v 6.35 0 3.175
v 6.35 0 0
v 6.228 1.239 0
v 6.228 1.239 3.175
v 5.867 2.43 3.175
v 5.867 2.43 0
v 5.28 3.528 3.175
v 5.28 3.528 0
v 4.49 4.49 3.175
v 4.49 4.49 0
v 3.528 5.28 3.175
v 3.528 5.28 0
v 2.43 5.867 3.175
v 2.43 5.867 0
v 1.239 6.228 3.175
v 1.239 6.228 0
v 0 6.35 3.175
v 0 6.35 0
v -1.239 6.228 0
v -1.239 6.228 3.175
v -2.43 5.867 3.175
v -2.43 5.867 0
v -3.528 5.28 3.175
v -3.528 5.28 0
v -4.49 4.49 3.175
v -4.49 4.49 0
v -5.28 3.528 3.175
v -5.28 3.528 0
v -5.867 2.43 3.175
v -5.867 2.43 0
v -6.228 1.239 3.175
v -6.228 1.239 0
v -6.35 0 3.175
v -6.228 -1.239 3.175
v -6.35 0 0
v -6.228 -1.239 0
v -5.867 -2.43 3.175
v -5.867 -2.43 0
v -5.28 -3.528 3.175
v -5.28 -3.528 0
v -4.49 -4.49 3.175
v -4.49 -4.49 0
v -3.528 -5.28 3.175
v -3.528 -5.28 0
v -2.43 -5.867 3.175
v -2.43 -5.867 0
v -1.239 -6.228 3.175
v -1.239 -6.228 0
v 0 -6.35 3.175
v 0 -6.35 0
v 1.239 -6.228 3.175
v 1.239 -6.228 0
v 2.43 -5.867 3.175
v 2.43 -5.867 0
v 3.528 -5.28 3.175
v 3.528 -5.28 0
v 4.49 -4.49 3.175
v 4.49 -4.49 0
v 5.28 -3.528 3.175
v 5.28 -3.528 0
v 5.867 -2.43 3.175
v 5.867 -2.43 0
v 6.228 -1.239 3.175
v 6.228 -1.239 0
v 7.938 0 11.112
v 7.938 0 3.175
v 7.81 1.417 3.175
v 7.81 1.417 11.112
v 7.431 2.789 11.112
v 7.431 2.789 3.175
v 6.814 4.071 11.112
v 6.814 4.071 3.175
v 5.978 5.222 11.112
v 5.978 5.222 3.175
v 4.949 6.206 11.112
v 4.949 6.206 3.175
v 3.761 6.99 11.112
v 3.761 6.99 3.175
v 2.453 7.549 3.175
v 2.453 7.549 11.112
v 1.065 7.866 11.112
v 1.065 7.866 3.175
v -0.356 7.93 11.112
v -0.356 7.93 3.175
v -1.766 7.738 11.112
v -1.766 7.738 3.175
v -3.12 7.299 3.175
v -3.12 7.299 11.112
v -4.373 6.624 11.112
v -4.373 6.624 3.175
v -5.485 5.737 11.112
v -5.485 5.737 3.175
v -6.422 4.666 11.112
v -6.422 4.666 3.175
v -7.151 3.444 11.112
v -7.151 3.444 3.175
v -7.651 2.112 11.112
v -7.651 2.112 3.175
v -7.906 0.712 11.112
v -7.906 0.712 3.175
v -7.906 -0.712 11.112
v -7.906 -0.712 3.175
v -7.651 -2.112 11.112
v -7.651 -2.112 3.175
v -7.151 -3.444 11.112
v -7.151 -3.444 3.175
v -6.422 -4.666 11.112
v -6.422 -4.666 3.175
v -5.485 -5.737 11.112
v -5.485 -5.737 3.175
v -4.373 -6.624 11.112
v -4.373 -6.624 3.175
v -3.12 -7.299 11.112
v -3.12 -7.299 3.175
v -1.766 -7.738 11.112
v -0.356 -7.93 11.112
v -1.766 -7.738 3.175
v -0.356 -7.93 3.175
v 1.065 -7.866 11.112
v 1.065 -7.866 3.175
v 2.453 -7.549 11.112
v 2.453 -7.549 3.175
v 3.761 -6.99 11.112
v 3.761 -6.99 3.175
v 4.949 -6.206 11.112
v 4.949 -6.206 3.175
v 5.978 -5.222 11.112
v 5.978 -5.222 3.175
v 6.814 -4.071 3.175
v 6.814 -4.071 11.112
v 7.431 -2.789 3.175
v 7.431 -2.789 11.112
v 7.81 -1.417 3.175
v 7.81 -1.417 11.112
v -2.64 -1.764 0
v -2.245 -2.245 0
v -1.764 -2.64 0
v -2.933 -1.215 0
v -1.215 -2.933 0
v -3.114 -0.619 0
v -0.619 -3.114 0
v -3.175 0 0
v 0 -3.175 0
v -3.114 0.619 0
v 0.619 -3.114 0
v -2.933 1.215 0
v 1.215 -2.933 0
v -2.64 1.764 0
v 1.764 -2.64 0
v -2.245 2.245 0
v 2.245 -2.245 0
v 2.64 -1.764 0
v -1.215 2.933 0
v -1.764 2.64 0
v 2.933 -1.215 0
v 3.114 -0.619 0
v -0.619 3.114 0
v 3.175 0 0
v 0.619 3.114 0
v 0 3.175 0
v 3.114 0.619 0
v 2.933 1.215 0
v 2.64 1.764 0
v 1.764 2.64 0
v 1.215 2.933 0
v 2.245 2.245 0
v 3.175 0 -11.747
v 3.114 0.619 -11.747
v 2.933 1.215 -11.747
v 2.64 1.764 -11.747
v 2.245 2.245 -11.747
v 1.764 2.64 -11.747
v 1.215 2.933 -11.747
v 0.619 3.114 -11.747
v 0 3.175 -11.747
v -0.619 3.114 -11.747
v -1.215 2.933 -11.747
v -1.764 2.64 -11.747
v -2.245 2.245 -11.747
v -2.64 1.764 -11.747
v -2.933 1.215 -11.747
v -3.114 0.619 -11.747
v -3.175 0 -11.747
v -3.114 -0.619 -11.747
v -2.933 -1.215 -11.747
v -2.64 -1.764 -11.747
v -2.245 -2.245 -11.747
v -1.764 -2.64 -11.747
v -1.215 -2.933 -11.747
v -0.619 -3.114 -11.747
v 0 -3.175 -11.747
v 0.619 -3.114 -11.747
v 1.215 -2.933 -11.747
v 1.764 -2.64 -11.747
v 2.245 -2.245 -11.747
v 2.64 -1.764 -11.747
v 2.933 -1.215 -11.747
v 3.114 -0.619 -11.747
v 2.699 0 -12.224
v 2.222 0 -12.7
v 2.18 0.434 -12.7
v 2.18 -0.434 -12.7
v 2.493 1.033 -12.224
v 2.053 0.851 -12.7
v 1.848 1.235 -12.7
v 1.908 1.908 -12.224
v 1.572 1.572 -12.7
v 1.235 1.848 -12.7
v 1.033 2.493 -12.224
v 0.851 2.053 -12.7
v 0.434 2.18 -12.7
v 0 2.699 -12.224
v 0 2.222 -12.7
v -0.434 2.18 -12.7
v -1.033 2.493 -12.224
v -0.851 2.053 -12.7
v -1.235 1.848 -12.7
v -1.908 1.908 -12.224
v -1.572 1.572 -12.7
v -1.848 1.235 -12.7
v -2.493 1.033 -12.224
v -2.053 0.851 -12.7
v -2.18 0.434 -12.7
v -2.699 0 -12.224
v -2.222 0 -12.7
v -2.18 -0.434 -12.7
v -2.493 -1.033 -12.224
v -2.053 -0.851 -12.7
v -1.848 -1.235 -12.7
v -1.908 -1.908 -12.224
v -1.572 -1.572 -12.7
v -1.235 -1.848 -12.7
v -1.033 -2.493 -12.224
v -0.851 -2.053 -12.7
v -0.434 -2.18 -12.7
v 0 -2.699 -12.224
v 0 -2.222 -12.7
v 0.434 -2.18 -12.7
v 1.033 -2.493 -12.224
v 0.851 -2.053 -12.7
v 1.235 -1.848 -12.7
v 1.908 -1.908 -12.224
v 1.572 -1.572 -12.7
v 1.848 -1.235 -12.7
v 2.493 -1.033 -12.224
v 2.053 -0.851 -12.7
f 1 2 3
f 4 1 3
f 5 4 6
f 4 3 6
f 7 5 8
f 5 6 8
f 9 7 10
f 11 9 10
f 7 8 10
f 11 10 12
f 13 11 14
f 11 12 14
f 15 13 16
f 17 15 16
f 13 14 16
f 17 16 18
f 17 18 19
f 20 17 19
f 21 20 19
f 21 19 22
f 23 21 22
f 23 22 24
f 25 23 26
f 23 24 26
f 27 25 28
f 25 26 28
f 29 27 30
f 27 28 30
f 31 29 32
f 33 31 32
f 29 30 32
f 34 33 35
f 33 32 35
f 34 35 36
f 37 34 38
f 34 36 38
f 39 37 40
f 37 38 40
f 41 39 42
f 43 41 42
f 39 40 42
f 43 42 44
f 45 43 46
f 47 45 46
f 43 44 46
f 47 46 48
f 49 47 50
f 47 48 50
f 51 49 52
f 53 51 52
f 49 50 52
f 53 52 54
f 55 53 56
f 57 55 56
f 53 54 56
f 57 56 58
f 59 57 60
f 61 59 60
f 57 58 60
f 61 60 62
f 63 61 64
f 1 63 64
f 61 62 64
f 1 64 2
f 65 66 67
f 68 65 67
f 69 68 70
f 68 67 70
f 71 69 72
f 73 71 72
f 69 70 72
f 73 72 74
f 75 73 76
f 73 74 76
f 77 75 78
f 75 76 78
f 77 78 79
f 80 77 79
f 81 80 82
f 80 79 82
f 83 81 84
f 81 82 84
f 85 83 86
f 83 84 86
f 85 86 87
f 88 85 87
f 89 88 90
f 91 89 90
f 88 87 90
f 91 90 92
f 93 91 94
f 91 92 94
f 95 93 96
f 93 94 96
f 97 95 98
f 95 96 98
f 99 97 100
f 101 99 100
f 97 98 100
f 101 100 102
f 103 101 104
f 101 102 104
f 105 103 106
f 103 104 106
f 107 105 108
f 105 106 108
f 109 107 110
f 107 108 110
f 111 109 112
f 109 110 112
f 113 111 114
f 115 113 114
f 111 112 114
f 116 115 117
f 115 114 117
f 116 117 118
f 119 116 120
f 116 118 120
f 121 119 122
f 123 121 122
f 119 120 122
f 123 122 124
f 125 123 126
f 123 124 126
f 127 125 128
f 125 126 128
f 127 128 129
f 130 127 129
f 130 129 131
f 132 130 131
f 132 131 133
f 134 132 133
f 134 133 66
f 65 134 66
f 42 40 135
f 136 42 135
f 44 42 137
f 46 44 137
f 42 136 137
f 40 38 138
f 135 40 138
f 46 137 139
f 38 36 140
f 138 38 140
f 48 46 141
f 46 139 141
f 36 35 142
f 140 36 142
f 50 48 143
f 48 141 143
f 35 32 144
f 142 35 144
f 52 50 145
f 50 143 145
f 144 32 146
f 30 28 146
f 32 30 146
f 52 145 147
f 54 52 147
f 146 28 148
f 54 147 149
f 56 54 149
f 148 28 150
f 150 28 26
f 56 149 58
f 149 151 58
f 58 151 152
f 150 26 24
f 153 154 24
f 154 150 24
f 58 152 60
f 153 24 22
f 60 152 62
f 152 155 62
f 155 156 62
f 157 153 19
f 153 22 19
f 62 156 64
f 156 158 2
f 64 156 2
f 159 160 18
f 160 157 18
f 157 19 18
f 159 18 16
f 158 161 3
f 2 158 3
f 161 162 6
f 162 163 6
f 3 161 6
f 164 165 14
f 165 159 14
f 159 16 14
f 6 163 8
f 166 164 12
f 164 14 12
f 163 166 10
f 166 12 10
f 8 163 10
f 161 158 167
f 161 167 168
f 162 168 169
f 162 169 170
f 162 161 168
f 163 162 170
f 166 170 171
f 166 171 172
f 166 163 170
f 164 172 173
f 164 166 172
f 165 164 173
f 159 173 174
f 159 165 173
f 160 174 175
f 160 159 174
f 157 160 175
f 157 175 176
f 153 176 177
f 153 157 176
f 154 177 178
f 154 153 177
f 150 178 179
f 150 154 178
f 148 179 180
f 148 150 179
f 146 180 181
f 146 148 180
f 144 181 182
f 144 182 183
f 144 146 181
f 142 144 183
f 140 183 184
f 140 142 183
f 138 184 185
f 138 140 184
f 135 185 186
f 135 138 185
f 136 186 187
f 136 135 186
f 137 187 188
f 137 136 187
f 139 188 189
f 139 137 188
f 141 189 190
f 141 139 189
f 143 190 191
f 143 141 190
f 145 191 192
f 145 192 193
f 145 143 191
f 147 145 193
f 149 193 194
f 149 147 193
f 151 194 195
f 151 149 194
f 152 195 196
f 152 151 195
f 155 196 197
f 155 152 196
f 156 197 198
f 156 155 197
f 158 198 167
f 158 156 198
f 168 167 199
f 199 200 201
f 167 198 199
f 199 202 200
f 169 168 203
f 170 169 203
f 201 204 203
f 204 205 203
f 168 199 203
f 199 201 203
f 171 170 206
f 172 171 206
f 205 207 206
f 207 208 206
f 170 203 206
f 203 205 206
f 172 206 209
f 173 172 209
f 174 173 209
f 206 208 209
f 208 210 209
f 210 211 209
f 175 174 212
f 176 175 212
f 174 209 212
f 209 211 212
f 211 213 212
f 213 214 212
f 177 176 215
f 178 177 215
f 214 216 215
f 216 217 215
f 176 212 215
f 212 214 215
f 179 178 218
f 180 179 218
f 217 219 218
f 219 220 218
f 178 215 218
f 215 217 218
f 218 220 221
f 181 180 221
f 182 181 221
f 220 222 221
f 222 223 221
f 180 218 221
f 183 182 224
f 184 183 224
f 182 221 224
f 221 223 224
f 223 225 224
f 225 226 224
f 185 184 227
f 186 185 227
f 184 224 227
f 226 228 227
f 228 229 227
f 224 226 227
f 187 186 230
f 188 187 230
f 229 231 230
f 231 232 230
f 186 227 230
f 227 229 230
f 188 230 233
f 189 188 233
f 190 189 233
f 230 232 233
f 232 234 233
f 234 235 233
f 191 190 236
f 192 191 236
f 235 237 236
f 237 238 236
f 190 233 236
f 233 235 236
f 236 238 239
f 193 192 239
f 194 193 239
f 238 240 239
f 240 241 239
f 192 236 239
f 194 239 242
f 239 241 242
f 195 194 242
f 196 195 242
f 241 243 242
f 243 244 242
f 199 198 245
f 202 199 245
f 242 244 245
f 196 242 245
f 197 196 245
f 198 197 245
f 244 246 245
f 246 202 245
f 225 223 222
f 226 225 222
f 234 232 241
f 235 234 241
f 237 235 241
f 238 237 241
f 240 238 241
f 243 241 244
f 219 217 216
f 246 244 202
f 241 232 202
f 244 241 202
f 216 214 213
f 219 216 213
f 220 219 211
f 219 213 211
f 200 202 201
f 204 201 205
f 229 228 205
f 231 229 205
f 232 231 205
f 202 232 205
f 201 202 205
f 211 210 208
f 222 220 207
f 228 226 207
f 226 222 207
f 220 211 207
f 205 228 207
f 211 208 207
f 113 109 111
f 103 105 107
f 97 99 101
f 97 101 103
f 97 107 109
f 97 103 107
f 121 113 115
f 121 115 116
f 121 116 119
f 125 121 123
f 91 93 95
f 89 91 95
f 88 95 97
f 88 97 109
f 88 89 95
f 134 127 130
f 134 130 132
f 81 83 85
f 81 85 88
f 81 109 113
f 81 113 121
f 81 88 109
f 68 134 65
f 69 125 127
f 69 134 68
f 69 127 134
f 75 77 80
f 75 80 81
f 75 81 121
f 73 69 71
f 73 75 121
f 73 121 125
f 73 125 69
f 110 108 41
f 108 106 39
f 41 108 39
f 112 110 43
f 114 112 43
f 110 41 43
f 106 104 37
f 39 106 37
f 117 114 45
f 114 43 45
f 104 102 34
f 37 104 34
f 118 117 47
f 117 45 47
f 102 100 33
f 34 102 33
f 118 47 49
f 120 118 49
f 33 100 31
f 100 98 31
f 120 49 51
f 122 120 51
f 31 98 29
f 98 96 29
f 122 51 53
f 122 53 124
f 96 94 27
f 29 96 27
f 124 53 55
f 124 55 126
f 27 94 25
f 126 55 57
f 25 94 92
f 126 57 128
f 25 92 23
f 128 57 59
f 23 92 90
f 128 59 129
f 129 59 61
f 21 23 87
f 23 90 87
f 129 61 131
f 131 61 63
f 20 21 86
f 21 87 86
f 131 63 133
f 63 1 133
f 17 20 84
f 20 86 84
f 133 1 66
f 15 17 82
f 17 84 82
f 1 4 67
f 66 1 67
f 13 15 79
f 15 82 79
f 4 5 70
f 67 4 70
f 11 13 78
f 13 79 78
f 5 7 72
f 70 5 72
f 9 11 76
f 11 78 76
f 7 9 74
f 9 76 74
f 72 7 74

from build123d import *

# Parameters (mm, degrees)
SKETCH1_R           = 3.175
EXTRUDE1_DEPTH      = 12.7
CHAMFER2_SIZE       = 0.9525
SKETCH27_R          = 6.35
BOSS_EXTRUDE4_DEPTH = 3.175
SKETCH21_R          = 7.9375
BOSS_EXTRUDE1_DEPTH = 7.9375


with BuildPart() as part:
    # Sketch1 → Extrude1 (new body)
    with BuildSketch(Plane.XY):
        Circle(SKETCH1_R)
    extrude(amount=-EXTRUDE1_DEPTH)

    # Chamfer2
    chamfer2_edges = [part.edges().sort_by_distance(p)[0] for p in [
        (-3.175, 0, -12.7),
    ]]
    chamfer(chamfer2_edges, length=CHAMFER2_SIZE)

    # Sketch27 → Boss-Extrude4 (add)
    with BuildSketch(Plane.XY):
        Circle(SKETCH27_R)
    extrude(amount=BOSS_EXTRUDE4_DEPTH)

    # Sketch21 → Boss-Extrude1 (add)
    with BuildSketch(Plane.XY.offset(3.175)):
        Circle(SKETCH21_R)
    extrude(amount=BOSS_EXTRUDE1_DEPTH)


solid = part.part
